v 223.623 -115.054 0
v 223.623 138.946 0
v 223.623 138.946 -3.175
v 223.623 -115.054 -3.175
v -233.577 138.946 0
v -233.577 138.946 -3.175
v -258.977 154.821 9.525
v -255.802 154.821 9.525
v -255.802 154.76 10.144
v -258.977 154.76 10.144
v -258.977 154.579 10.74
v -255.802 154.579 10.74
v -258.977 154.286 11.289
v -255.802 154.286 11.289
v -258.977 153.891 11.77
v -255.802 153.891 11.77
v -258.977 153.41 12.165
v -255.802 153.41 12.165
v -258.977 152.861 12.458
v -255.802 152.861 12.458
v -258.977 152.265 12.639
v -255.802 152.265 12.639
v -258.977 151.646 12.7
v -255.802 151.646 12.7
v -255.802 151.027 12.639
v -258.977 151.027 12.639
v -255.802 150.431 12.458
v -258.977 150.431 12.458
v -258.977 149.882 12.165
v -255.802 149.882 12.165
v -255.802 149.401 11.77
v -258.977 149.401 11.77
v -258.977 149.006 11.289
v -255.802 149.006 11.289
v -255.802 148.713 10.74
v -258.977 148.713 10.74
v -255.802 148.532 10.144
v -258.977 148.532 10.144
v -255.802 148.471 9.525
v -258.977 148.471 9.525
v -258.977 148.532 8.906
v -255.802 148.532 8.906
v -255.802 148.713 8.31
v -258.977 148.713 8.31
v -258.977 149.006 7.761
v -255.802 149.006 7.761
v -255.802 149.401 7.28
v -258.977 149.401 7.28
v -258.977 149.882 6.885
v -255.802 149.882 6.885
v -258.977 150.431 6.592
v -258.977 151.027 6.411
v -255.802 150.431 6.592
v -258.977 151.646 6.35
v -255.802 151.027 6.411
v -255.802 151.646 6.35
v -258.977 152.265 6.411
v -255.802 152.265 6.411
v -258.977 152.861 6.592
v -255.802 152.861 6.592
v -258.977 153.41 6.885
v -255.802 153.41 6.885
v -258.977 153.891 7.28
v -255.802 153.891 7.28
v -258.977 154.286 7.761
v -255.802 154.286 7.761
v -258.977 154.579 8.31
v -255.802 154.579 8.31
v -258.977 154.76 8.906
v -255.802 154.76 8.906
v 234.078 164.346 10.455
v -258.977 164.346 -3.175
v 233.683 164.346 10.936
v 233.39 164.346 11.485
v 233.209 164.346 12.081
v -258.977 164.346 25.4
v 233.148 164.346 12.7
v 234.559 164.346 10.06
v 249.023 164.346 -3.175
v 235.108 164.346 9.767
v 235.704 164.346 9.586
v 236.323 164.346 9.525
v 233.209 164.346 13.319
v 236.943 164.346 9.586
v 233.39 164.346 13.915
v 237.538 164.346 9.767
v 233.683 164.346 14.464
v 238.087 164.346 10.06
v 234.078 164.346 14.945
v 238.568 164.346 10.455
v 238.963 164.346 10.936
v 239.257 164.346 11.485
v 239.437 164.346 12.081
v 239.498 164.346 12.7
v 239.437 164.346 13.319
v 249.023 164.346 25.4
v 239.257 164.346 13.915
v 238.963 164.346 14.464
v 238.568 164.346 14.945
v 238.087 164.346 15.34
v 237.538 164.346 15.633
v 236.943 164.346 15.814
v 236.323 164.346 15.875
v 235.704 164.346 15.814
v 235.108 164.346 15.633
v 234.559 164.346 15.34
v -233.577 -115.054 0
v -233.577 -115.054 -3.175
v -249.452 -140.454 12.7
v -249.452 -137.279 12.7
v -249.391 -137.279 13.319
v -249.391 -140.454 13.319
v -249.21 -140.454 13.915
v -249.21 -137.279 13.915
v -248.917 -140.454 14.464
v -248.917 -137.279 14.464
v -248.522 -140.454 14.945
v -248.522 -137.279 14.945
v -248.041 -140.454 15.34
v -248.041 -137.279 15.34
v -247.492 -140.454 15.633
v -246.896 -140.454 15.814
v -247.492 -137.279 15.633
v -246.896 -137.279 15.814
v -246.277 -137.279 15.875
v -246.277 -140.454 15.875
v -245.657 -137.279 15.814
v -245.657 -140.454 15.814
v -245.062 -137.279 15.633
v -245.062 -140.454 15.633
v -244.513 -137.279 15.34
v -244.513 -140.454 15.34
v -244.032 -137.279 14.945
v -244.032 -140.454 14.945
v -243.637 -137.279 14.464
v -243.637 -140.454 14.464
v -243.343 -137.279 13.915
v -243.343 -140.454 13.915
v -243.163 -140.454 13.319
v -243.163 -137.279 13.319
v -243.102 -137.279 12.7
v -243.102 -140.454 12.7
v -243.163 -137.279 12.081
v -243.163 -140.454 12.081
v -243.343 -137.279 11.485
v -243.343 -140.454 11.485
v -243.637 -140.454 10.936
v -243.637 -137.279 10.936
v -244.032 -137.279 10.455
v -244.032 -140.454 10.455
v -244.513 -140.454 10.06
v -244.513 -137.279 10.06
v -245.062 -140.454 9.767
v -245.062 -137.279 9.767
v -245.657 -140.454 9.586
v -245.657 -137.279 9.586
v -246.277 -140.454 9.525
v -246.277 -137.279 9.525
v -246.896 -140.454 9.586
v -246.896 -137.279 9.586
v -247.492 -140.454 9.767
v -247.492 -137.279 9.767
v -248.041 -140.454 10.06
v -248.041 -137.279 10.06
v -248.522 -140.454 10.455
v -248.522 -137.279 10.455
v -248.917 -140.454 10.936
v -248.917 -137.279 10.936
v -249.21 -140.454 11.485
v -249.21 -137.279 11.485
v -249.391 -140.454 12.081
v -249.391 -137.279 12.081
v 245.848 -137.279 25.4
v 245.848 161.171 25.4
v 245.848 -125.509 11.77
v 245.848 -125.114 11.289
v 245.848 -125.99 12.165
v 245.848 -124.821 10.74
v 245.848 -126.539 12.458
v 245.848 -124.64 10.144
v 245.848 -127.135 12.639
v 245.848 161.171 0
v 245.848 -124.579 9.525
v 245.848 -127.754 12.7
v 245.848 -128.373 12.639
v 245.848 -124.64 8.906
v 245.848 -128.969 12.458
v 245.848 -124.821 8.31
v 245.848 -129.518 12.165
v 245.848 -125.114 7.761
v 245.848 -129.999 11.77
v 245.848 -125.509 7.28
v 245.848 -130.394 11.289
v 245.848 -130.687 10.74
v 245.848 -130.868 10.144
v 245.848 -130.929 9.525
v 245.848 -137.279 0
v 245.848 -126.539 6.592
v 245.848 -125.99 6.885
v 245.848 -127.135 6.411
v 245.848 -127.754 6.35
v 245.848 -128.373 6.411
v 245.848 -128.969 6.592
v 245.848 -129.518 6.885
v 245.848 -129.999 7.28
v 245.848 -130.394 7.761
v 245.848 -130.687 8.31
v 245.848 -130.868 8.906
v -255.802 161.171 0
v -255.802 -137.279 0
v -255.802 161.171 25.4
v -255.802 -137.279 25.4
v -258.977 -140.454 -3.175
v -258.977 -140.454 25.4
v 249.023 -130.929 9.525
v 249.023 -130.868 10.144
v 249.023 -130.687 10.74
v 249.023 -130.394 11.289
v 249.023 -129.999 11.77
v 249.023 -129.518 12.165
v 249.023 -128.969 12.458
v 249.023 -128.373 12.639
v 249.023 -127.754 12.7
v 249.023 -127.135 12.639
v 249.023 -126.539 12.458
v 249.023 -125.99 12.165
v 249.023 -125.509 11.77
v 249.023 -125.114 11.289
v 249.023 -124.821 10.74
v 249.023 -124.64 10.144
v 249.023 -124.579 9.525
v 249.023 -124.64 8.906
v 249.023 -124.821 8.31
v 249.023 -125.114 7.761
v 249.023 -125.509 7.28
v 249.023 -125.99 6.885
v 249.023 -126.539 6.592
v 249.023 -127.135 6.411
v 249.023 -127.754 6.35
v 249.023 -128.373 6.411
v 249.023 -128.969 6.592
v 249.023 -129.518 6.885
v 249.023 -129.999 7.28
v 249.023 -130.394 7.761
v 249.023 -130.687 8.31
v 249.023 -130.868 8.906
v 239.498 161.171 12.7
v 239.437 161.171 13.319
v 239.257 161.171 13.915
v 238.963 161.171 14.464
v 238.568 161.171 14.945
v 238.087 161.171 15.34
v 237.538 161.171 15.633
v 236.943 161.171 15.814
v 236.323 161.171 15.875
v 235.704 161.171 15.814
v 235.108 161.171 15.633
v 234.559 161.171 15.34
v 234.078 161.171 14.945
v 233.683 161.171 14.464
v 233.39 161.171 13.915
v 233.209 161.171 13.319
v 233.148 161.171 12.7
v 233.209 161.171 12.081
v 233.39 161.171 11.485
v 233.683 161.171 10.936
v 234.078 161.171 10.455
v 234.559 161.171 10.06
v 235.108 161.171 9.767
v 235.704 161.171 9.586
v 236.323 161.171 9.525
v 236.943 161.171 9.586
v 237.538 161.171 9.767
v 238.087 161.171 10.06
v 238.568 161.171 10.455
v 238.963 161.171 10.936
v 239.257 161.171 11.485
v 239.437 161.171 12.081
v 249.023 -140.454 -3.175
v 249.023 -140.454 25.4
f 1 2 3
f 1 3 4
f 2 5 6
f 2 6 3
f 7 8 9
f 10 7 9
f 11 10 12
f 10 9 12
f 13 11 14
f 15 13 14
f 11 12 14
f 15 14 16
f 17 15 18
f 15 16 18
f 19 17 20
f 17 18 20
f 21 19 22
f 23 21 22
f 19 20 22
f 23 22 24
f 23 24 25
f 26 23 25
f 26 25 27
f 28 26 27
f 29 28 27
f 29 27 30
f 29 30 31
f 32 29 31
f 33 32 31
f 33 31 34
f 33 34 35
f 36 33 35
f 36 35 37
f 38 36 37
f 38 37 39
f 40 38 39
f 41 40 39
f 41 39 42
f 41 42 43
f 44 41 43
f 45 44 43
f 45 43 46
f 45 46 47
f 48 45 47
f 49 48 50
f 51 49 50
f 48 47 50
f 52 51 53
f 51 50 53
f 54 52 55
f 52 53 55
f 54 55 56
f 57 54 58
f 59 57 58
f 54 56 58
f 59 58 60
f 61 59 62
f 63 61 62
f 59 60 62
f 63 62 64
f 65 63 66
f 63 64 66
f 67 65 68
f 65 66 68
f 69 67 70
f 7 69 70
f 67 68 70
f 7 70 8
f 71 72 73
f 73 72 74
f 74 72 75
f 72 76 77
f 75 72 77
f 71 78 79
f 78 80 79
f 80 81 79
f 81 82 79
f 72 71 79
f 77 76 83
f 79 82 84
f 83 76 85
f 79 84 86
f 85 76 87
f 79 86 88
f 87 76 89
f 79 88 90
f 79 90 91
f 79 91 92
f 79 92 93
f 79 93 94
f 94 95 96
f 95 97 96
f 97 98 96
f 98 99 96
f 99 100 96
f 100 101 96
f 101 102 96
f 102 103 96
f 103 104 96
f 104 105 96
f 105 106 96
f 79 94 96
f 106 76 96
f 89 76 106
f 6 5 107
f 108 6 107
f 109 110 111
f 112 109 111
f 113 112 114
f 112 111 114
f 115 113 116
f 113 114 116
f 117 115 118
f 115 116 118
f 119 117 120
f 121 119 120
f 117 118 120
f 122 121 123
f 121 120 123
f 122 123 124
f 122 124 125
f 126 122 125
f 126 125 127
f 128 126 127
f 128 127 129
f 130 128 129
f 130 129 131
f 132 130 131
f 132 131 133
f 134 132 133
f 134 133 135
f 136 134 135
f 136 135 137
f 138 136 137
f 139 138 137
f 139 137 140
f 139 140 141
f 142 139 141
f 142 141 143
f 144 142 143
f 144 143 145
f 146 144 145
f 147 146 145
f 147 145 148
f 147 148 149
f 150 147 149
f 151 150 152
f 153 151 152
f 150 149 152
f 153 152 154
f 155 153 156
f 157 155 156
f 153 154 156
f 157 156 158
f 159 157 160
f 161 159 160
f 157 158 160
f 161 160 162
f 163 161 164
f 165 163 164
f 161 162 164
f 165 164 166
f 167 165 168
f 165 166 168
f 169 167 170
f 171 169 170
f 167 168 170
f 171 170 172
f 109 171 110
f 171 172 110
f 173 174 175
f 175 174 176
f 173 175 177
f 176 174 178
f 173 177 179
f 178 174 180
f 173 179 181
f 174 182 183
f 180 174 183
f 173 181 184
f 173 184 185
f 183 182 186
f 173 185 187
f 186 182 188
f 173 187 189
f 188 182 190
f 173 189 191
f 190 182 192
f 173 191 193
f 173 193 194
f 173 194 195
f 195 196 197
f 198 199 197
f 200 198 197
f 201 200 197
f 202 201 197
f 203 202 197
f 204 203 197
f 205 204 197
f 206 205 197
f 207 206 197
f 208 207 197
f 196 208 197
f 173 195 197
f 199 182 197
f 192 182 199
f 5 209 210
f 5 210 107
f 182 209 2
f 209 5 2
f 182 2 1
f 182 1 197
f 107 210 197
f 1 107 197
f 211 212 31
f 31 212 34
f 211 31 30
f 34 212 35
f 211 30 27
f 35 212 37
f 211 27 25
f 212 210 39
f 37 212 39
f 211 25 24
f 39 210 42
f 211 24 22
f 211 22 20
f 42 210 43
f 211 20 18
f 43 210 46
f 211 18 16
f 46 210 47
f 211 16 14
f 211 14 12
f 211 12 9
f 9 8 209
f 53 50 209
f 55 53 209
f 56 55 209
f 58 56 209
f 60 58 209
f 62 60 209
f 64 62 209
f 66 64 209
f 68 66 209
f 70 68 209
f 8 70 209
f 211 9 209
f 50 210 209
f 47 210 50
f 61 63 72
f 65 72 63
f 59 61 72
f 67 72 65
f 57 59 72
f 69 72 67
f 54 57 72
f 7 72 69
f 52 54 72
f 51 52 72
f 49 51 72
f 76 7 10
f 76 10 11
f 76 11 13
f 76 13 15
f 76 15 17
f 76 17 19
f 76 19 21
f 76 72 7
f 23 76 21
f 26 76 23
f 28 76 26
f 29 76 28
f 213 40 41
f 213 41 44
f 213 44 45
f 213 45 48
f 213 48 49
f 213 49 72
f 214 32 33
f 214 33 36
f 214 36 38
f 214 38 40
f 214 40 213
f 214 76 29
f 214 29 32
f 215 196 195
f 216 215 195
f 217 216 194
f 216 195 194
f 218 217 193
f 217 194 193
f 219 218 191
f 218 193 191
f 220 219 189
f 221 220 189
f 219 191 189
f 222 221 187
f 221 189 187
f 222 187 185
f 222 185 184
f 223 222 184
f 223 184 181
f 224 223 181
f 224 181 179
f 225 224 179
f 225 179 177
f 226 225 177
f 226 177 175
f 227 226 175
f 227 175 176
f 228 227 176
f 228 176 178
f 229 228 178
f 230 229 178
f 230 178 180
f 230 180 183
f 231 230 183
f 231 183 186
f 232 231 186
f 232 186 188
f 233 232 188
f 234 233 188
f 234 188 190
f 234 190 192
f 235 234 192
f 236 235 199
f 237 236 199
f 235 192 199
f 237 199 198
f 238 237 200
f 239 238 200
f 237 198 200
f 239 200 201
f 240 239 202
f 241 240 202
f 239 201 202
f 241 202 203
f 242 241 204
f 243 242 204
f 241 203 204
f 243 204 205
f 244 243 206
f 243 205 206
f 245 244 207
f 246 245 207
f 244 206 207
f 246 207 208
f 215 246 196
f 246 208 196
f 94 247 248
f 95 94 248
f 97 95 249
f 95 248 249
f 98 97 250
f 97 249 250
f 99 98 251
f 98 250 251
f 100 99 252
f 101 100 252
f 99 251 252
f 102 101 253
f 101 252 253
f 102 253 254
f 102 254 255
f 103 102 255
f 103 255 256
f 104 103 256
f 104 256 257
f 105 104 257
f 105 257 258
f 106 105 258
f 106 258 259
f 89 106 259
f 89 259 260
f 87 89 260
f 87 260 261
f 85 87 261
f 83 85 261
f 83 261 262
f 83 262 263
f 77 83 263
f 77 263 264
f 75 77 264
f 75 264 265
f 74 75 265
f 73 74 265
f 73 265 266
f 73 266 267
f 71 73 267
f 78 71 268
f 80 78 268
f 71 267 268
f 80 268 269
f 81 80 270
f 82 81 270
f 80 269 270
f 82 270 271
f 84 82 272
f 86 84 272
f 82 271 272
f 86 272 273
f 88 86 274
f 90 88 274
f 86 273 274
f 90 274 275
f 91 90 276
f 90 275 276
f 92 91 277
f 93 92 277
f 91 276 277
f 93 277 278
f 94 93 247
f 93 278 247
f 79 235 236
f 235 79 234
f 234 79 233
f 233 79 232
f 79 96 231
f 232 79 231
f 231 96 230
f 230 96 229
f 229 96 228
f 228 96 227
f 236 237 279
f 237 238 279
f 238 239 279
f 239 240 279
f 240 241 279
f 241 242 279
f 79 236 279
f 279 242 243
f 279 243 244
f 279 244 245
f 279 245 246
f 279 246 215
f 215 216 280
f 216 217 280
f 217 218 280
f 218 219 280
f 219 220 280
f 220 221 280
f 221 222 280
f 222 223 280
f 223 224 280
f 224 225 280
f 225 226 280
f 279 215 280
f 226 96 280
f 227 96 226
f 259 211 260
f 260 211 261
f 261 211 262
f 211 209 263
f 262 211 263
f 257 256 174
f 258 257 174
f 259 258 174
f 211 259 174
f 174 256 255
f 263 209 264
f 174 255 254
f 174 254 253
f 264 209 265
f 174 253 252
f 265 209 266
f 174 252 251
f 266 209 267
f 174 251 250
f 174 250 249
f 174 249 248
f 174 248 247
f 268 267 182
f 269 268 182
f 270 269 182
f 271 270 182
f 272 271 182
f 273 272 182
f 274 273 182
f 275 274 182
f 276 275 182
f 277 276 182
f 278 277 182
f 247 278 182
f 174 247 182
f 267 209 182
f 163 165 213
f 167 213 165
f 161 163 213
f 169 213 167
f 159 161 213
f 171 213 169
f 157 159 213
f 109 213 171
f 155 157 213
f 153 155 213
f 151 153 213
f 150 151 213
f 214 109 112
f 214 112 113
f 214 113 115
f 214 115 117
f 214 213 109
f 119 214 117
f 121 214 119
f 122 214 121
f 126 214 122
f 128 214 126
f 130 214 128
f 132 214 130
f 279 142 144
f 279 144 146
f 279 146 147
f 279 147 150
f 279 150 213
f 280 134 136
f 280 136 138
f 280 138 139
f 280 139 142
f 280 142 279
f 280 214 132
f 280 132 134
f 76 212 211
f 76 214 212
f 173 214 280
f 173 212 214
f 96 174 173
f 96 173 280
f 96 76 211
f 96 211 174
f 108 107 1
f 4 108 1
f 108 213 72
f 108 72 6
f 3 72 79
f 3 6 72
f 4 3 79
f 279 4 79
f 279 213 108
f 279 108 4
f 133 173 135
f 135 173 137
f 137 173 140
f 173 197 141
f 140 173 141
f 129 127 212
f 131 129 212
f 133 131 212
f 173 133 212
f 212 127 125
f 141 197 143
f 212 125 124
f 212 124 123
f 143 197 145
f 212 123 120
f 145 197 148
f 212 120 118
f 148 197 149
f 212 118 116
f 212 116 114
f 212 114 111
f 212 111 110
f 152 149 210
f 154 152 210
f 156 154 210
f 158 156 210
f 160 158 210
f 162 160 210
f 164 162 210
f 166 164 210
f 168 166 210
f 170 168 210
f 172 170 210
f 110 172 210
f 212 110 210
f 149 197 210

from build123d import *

# Parameters (mm, degrees)
F0_W      = 3.175
F0_H      = 254
F0_H_2    = 22.225
F0_H_3    = 3.175
F0_W_2    = 22.225
F0_W_3    = 457.2
F1_DEPTH  = 25.4
F2_W      = 508
F2_H      = 304.8
F2_W_2    = 501.65
F2_H_2    = 298.45
F2_W_3    = 457.2
F2_H_3    = 254
F3_DEPTH  = 3.175
F5_D      = 6.35
F5_DEPTH  = 12.7
F5_TIP    = 1.9077324654
F7_D      = 6.35
F7_DEPTH  = 12.7
F7_TIP    = 1.9077324654
F9_D      = 6.35
F9_DEPTH  = 12.7
F9_TIP    = 1.9077324654
F11_D     = 6.35
F11_DEPTH = 12.7
F11_TIP   = 1.9077324654


with BuildPart() as f1:
    # F0 (on Top) → F1 (new body)
    with BuildSketch(Plane.XY):
        with Locations((-257.3892009914, 11.9460101733)):
            Rectangle(F0_W, F0_H)
        with Locations((-257.3892009914, -126.1664898267)):
            Rectangle(F0_W, F0_H_2)
        with Locations((-257.3892009914, -138.8664898267)):
            Rectangle(F0_W, F0_H_3)
        with Locations((-244.6892009914, -138.8664898267)):
            Rectangle(F0_W_2, F0_H_3)
        with Locations((-4.9767009914, -138.8664898267)):
            Rectangle(F0_W_3, F0_H_3)
        with Locations((234.7357990086, -138.8664898267)):
            Rectangle(F0_W_2, F0_H_3)
        with Locations((247.4357990086, -138.8664898267)):
            Rectangle(F0_W, F0_H_3)
        with Locations((247.4357990086, -126.1664898267)):
            Rectangle(F0_W, F0_H_2)
        with Locations((247.4357990086, 11.9460101733)):
            Rectangle(F0_W, F0_H)
        with Locations((247.4357990086, 150.0585101733)):
            Rectangle(F0_W, F0_H_2)
        with Locations((247.4357990086, 162.7585101733)):
            Rectangle(F0_W, F0_H_3)
        with Locations((234.7357990086, 162.7585101733)):
            Rectangle(F0_W_2, F0_H_3)
        with Locations((-4.9767009914, 162.7585101733)):
            Rectangle(F0_W_3, F0_H_3)
        with Locations((-244.6892009914, 162.7585101733)):
            Rectangle(F0_W_2, F0_H_3)
        with Locations((-257.3892009914, 162.7585101733)):
            Rectangle(F0_W, F0_H_3)
        with Locations((-257.3892009914, 150.0585101733)):
            Rectangle(F0_W, F0_H_2)
    extrude(amount=F1_DEPTH)

    # F2 (on face) → F3 (join)
    with BuildSketch(Plane(origin=(0, 0, 0), x_dir=(1, 0, 0), z_dir=(0, 0, -1))):
        with Locations((-4.9767009914, -11.9460101733)):
            Rectangle(F2_W, F2_H)
        with Locations((-4.9767009914, -11.9460101733)):
            Rectangle(F2_W_2, F2_H_2, mode=Mode.SUBTRACT)
        with Locations((-4.9767009914, -11.9460101733)):
            Rectangle(F2_W_2, F2_H_2)
        with Locations((-4.9767009914, -11.9460101733)):
            Rectangle(F2_W_3, F2_H_3, mode=Mode.SUBTRACT)
    extrude(amount=F3_DEPTH)

    # F5
    with Locations(Plane.XZ.offset(140.4539898267)):
        with Locations((-246.2767009914, 12.7)):
            Hole(F5_D / 2, depth=F5_DEPTH)
            with Locations((0, 0, -(F5_DEPTH + F5_TIP / 2))):  # 118° drill point
                Cone(0, F5_D / 2, F5_TIP, mode=Mode.SUBTRACT)

    # F7
    with Locations(Plane.YZ.offset(249.0232990086)):
        with Locations((-127.7539898267, 9.525)):
            Hole(F7_D / 2, depth=F7_DEPTH)
            with Locations((0, 0, -(F7_DEPTH + F7_TIP / 2))):  # 118° drill point
                Cone(0, F7_D / 2, F7_TIP, mode=Mode.SUBTRACT)

    # F9
    with Locations(Plane(origin=(0, 164.3460101733, 0), x_dir=(-1, 0, 0), z_dir=(0, 1, 0))):
        with Locations((-236.3232990086, 12.7)):
            Hole(F9_D / 2, depth=F9_DEPTH)
            with Locations((0, 0, -(F9_DEPTH + F9_TIP / 2))):  # 118° drill point
                Cone(0, F9_D / 2, F9_TIP, mode=Mode.SUBTRACT)

    # F11
    with Locations(Plane(origin=(-258.9767009914, 0, 0), x_dir=(0, -1, 0), z_dir=(-1, 0, 0))):
        with Locations((-151.6460101733, 9.525)):
            Hole(F11_D / 2, depth=F11_DEPTH)
            with Locations((0, 0, -(F11_DEPTH + F11_TIP / 2))):  # 118° drill point
                Cone(0, F11_D / 2, F11_TIP, mode=Mode.SUBTRACT)


solid = f1.part
